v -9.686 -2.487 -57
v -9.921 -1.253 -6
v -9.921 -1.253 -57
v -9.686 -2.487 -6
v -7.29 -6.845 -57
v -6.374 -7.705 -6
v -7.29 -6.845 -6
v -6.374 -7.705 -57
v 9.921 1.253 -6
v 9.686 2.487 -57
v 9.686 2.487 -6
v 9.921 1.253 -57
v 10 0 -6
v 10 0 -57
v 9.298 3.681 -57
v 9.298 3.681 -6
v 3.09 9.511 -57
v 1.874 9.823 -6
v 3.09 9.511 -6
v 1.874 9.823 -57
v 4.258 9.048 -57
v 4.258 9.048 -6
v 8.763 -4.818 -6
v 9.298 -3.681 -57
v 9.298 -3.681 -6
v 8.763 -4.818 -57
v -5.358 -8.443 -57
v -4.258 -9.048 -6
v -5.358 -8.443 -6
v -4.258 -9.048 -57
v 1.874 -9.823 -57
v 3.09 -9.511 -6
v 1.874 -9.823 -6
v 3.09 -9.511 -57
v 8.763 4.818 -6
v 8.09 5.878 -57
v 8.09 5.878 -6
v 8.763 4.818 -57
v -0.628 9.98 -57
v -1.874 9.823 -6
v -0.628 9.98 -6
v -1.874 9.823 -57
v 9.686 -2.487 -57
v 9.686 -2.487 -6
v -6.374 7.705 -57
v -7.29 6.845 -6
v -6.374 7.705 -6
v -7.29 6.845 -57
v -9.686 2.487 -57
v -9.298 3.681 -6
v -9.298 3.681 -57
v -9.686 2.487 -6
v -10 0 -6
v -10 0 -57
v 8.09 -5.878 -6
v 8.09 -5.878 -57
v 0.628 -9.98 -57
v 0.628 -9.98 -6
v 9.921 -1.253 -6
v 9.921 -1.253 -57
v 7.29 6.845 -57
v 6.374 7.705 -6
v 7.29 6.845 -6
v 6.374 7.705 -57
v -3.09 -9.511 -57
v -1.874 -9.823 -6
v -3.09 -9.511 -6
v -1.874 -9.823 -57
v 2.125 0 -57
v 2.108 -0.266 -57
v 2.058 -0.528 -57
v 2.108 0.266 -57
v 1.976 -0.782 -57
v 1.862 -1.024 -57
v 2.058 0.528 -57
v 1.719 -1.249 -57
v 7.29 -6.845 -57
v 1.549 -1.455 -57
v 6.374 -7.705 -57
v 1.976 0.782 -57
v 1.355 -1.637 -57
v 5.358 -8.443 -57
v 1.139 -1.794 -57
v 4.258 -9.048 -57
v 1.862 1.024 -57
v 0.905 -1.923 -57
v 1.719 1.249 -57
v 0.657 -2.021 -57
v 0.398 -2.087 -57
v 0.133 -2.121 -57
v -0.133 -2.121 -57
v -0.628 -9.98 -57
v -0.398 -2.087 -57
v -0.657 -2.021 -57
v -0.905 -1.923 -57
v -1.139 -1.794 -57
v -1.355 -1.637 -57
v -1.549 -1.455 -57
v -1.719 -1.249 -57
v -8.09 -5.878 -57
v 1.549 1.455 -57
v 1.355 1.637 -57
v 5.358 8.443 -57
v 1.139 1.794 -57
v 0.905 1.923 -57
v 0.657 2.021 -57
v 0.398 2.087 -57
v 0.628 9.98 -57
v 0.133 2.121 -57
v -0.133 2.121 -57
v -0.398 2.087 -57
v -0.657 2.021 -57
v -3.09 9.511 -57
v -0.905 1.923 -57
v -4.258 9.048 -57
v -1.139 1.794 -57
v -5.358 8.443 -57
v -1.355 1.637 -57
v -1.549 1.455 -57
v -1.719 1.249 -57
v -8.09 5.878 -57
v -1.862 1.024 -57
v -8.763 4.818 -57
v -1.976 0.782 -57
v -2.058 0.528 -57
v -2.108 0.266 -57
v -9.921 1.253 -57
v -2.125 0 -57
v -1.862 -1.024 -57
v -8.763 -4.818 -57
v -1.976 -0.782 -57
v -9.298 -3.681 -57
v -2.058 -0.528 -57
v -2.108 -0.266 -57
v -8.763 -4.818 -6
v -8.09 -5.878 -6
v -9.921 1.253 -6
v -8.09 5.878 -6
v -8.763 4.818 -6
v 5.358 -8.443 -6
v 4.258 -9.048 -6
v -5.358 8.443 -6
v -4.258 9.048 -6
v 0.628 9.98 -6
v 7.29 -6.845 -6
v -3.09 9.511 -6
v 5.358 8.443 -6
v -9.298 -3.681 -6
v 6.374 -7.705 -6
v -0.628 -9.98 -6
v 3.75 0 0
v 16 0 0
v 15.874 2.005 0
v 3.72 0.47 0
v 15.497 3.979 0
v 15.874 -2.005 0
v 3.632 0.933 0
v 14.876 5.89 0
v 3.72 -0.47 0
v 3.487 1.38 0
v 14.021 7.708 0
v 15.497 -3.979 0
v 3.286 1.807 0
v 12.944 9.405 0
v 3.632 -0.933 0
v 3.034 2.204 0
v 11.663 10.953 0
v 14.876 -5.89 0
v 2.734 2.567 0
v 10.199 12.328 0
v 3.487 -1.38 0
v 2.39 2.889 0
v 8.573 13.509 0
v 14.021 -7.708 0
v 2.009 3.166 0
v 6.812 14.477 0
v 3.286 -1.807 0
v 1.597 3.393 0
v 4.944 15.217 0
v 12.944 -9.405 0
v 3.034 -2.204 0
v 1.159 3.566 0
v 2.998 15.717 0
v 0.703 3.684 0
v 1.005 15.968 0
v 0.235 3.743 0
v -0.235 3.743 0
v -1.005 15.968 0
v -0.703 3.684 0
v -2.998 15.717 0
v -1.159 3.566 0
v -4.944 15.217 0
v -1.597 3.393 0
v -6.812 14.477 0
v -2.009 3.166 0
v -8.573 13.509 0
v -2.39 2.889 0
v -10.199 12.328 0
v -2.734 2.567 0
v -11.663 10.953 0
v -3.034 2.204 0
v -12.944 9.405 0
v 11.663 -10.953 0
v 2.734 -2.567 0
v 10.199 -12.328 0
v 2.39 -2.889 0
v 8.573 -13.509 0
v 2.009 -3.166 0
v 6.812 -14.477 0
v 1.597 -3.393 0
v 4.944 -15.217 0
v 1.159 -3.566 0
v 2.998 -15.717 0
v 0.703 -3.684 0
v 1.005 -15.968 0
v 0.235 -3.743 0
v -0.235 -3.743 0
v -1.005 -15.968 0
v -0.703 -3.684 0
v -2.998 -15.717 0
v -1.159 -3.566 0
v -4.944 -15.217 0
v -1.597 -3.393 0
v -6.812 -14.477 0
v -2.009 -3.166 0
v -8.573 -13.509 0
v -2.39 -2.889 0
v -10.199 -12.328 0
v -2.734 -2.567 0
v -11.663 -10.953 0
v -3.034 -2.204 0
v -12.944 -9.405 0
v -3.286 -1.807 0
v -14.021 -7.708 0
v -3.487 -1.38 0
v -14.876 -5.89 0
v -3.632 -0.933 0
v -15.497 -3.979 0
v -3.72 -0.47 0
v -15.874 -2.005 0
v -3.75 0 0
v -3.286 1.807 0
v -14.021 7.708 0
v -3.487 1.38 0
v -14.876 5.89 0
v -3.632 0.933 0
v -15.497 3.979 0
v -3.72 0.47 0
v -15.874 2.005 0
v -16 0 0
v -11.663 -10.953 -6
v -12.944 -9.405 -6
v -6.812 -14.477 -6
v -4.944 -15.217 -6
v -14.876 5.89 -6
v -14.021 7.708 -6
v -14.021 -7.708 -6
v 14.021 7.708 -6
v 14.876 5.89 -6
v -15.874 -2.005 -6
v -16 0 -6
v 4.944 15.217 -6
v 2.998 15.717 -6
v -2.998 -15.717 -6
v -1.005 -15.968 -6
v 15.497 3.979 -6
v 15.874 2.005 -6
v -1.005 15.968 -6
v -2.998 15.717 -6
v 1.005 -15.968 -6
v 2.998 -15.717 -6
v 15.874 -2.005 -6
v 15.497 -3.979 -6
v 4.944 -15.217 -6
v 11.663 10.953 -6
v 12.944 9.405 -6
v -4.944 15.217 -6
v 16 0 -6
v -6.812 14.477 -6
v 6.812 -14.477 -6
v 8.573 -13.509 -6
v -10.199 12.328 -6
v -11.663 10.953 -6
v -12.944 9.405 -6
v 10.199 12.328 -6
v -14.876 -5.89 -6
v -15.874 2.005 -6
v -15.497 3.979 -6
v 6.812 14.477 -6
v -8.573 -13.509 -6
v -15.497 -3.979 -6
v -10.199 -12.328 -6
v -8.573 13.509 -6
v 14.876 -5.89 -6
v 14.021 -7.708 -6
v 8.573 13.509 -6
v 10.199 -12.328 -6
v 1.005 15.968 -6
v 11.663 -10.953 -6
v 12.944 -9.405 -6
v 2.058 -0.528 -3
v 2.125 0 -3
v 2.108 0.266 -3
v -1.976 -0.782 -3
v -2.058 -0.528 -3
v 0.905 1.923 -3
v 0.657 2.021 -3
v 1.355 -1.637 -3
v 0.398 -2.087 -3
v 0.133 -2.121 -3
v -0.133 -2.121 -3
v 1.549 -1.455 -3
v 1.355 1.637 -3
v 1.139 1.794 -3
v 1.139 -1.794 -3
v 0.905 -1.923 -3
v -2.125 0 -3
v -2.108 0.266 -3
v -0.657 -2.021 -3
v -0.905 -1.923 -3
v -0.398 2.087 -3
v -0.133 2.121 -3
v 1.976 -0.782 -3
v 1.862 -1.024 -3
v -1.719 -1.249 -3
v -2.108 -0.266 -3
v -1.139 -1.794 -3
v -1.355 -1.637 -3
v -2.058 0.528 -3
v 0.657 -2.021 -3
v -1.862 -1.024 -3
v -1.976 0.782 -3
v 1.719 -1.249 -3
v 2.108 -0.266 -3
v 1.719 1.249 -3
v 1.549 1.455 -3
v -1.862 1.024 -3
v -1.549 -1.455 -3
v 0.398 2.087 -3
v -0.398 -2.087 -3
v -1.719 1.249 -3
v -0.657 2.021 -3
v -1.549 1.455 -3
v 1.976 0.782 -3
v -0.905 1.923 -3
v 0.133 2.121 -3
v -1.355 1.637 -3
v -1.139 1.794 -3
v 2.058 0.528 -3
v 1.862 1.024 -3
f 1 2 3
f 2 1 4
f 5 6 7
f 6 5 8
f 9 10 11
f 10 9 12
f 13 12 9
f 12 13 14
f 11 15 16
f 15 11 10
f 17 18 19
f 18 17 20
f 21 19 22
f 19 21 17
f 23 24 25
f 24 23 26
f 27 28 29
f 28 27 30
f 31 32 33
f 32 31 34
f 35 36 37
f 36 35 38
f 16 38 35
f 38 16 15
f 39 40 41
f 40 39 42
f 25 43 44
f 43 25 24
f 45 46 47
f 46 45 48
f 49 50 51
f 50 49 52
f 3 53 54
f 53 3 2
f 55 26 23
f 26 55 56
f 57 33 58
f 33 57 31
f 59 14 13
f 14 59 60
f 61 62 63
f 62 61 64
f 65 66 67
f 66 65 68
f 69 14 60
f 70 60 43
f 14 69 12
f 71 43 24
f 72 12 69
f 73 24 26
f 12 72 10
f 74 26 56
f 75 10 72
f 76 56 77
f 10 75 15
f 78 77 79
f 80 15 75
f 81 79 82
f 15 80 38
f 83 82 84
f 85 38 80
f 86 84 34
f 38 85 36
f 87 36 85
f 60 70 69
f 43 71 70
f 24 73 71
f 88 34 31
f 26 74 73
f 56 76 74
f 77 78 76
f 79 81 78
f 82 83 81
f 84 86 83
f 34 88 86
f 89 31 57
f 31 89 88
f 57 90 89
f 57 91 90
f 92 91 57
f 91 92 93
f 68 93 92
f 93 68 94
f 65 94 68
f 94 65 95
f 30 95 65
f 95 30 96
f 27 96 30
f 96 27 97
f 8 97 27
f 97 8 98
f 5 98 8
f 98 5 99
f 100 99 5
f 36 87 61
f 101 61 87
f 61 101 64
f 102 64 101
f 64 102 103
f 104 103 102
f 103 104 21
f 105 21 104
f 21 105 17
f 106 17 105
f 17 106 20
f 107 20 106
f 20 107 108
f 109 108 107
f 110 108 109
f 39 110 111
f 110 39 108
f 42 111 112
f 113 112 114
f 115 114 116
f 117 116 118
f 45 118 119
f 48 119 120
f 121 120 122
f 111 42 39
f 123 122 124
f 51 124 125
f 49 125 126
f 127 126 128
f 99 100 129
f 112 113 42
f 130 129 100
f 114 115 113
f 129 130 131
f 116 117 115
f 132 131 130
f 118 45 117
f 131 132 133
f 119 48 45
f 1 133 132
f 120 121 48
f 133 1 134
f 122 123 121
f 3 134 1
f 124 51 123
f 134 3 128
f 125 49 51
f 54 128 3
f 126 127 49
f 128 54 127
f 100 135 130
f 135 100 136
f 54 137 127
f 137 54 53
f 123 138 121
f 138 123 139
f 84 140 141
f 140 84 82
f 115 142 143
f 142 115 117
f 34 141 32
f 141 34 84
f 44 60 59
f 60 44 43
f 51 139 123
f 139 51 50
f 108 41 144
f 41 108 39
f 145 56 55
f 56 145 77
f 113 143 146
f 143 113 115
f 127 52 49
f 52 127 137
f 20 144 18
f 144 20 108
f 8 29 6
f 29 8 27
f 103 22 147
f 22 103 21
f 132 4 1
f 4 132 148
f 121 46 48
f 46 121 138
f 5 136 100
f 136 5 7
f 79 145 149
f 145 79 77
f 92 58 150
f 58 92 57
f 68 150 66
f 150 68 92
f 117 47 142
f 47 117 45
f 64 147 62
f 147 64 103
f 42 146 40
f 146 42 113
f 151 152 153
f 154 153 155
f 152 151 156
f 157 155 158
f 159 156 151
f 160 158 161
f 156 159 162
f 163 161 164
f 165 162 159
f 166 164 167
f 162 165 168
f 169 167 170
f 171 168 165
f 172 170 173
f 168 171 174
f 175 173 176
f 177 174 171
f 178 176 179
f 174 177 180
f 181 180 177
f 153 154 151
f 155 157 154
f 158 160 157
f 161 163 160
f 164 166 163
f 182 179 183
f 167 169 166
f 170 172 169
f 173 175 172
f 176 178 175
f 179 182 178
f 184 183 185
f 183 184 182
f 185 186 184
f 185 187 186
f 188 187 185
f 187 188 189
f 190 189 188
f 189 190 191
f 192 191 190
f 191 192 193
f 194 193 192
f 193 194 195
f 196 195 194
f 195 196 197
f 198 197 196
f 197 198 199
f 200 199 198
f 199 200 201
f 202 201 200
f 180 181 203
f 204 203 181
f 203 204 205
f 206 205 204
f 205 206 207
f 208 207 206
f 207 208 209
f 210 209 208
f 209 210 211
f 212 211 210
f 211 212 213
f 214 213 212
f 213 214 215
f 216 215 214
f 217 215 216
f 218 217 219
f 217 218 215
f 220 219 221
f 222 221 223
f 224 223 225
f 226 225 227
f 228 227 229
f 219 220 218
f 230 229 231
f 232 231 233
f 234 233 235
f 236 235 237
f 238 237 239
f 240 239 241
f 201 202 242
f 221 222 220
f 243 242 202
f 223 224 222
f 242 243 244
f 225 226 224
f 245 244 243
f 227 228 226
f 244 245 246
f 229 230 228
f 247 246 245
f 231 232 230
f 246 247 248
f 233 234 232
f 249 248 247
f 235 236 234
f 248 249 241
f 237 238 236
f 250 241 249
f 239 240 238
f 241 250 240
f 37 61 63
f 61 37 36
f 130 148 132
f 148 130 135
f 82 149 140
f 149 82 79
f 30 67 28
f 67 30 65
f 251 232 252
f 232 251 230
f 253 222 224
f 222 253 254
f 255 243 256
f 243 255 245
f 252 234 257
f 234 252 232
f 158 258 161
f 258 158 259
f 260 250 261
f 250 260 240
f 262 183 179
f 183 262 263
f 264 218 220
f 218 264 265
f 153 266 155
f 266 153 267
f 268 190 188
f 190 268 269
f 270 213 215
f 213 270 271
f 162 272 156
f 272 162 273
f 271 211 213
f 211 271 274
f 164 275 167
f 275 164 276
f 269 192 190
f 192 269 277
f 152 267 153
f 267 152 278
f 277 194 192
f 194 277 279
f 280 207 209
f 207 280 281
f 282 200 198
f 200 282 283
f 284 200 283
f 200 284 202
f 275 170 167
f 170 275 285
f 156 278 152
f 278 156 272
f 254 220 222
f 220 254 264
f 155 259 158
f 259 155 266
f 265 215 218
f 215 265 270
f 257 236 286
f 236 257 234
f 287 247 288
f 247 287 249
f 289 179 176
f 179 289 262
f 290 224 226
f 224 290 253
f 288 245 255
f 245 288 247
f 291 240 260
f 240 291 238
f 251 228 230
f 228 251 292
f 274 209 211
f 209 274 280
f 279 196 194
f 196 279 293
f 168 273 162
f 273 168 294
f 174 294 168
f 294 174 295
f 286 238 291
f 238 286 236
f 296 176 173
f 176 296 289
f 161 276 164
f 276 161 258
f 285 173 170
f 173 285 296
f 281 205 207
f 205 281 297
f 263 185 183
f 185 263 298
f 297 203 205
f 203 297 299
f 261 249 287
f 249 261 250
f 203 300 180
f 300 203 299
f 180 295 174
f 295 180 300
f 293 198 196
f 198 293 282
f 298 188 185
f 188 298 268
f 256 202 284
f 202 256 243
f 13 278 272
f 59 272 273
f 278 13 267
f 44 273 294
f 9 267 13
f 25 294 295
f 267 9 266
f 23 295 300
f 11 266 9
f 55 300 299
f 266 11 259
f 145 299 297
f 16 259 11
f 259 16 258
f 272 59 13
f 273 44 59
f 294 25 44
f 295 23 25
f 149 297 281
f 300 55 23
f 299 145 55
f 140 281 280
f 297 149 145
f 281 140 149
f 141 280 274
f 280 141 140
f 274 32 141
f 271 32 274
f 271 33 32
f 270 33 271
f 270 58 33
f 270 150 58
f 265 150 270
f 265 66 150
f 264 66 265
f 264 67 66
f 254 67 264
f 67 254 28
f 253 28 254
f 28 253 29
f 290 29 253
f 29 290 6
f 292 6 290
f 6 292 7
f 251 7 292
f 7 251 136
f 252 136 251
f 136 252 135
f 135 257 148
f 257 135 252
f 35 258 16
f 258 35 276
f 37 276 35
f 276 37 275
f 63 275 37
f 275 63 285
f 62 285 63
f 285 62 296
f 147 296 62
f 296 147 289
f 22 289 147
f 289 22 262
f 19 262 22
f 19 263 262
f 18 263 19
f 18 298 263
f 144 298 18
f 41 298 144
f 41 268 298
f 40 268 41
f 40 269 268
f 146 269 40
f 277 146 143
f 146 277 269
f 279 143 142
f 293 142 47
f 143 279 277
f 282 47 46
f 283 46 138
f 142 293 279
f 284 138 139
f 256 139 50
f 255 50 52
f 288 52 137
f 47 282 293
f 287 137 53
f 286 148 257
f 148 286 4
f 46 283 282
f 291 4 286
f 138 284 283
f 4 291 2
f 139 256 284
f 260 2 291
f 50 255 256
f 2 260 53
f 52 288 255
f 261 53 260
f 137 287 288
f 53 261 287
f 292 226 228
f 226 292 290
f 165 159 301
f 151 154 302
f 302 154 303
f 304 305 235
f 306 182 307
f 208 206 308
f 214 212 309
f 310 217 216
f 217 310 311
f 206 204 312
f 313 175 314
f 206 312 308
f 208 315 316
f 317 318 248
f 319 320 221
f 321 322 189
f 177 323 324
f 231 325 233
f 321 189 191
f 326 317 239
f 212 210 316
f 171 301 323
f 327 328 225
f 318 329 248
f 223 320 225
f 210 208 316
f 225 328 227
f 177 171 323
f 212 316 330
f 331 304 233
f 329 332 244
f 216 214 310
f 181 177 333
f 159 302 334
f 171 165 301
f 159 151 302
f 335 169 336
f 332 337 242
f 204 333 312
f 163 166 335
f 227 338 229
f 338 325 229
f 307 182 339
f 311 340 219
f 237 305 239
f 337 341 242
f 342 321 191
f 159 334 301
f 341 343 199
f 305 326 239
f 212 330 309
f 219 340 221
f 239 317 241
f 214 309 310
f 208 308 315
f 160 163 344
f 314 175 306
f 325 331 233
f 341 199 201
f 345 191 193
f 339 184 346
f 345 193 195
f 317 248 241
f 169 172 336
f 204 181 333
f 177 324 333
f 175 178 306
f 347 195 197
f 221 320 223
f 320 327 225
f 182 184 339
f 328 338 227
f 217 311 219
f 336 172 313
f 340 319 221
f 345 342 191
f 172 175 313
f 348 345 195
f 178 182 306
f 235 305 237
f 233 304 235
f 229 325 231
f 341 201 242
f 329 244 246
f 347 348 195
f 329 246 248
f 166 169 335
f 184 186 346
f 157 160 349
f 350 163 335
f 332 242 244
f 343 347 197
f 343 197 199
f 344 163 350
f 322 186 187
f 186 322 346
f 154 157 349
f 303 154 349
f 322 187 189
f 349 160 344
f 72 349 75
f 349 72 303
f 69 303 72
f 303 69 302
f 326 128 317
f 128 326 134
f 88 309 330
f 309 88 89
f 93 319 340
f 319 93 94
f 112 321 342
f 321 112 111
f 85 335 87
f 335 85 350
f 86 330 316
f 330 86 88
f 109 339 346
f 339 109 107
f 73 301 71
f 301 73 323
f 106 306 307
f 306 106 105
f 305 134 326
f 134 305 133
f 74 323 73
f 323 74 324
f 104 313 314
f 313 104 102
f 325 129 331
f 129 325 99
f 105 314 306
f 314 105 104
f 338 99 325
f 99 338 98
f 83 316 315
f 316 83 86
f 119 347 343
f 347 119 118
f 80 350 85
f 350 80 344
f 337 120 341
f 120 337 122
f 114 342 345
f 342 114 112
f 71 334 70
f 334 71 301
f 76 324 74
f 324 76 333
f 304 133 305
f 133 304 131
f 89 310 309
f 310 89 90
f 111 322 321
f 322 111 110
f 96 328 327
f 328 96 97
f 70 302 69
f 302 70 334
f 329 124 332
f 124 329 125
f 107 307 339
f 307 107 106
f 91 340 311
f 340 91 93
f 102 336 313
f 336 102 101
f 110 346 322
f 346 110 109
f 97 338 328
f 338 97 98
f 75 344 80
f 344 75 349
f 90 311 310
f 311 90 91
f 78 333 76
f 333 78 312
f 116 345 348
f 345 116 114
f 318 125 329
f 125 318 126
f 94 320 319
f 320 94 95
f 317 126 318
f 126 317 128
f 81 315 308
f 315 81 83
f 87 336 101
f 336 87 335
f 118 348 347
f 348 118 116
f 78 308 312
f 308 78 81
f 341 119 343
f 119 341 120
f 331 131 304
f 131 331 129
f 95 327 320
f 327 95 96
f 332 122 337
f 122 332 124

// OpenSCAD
$fn = 50;


difference() {
	union() {
		translate(v = [0, 0, -57.0000000000]) {
			cylinder(h = 57, r = 10.0000000000);
		}
		translate(v = [0, 0, -6.0000000000]) {
			cylinder(h = 6, r = 16.0000000000);
		}
	}
	union() {
		translate(v = [0, 0, 0]) {
			rotate(a = [0, 0, 0]) {
				difference() {
					union() {
						#translate(v = [0, 0, -57.0000000000]) {
							cylinder(h = 57, r = 2.0000000000);
						}
						#translate(v = [0, 0, -3]) {
							cylinder(h = 3, r1 = 2.1250000000, r2 = 3.7500000000);
						}
						#translate(v = [0, 0, -57.0000000000]) {
							cylinder(h = 57, r = 2.1250000000);
						}
						#translate(v = [0, 0, -57.0000000000]) {
							cylinder(h = 57, r = 2.0000000000);
						}
					}
					union();
				}
			}
		}
	}
}
